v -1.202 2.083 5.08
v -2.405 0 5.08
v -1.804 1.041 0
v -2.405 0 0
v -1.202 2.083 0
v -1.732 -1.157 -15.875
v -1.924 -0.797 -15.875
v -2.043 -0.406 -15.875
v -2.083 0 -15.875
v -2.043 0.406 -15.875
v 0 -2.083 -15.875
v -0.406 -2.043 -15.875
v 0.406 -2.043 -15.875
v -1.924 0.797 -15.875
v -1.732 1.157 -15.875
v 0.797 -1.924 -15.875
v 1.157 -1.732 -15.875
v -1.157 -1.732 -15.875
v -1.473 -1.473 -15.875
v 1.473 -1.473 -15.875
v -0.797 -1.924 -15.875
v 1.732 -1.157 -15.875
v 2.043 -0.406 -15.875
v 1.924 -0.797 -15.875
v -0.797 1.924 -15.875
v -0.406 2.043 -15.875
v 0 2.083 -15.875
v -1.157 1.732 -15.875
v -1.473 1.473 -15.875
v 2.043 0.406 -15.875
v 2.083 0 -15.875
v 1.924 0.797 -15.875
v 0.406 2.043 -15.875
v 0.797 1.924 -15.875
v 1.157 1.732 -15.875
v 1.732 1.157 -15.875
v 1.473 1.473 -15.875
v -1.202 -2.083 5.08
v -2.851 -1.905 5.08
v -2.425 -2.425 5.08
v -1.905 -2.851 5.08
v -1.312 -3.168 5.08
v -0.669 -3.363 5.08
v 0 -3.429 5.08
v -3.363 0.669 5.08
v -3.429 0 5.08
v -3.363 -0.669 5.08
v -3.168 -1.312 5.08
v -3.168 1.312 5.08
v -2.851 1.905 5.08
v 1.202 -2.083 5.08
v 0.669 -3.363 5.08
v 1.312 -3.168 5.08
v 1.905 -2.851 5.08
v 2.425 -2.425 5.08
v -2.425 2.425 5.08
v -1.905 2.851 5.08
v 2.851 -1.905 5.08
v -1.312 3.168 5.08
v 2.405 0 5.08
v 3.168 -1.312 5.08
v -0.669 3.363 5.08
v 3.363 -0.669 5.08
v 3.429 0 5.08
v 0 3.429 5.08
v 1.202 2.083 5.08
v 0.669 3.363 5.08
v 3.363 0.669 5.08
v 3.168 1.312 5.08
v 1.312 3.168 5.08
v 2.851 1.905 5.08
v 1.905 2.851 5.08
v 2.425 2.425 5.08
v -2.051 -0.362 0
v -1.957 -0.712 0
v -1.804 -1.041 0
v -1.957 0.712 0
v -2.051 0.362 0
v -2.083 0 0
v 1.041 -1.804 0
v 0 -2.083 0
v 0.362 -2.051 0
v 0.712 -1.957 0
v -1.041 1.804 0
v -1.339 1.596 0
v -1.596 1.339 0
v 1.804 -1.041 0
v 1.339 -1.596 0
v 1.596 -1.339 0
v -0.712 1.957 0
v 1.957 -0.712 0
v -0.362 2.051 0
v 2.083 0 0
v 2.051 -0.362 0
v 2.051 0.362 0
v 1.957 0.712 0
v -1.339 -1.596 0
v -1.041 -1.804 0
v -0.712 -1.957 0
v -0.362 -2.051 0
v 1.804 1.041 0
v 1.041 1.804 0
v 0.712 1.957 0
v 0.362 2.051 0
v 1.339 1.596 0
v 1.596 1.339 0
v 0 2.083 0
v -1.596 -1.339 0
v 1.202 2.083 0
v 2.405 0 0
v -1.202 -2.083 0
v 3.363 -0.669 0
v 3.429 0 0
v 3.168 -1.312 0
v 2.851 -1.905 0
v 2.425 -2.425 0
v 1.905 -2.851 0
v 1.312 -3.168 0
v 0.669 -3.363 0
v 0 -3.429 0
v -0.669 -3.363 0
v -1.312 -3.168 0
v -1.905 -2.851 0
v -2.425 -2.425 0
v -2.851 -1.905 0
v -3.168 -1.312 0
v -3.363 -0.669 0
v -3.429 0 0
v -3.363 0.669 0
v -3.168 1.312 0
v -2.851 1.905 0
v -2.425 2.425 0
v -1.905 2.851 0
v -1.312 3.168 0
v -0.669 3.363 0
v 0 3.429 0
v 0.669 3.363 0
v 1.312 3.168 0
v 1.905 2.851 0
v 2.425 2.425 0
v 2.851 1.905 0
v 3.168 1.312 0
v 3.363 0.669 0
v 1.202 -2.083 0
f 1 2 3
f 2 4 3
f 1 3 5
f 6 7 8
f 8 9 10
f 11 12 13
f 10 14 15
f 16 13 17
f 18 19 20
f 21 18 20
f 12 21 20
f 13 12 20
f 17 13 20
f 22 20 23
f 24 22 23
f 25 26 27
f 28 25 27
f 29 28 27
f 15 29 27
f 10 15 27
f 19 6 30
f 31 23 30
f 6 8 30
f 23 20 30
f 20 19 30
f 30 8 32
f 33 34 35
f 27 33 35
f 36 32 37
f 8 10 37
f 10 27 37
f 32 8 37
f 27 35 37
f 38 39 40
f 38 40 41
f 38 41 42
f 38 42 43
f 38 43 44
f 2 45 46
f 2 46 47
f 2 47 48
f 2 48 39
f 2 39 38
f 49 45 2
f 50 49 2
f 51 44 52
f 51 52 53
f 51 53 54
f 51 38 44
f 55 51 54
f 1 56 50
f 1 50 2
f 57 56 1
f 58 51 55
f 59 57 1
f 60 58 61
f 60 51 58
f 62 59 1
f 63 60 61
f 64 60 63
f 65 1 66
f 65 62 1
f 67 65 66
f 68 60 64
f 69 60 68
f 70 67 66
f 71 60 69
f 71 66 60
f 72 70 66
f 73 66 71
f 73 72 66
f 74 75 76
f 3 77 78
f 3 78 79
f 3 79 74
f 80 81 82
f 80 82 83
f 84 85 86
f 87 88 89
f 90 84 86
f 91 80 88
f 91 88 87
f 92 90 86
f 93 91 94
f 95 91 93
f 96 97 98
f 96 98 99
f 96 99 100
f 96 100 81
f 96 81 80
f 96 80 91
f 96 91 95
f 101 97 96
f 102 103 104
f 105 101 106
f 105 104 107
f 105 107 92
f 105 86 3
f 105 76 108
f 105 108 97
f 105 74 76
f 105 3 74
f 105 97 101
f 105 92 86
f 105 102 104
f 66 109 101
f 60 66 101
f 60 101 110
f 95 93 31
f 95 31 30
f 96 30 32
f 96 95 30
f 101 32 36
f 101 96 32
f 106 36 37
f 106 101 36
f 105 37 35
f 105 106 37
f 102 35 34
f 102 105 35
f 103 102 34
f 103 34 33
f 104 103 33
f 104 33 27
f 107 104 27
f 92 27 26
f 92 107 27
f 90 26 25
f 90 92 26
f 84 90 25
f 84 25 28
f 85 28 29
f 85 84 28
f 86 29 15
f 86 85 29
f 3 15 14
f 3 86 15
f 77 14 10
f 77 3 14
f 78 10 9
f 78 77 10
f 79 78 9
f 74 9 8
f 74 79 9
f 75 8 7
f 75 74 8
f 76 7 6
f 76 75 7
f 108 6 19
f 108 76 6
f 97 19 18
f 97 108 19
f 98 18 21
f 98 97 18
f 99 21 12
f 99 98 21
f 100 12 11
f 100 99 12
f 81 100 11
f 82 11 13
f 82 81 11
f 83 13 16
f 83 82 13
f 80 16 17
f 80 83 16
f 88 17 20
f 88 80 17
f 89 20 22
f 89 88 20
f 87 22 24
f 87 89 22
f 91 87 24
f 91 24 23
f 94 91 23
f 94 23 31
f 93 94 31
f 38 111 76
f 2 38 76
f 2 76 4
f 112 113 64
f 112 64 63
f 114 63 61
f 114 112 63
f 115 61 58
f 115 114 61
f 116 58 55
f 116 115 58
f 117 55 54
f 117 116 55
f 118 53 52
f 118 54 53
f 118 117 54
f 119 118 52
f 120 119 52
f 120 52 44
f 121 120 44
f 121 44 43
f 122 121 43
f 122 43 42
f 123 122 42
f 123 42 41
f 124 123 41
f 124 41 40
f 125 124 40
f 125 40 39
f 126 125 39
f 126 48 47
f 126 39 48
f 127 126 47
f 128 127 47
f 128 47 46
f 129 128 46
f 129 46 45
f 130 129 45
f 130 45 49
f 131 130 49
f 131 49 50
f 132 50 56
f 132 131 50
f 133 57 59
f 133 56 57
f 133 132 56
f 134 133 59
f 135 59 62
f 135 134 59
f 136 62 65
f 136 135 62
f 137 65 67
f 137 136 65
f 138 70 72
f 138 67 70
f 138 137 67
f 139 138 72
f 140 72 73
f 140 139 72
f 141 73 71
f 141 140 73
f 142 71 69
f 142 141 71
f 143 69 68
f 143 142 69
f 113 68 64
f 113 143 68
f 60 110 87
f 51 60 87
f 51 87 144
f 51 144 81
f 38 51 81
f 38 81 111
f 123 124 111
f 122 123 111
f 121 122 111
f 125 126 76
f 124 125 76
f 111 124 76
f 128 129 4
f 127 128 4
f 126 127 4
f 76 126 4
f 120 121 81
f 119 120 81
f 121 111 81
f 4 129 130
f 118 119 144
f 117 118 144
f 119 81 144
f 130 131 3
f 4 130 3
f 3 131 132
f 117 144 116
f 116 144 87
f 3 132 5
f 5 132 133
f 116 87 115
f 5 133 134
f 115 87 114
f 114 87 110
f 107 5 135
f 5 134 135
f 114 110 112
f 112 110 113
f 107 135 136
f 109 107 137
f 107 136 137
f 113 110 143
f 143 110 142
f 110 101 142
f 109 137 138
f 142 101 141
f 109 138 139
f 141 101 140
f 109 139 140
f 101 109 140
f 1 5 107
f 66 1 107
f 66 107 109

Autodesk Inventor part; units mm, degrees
ref_plane "YZ Plane" through (0, 0, 0) normal (1, 0, 0) x (0, 1, 0)
ref_plane "XZ Plane" through (0, 0, 0) normal (0, 1, 0) x (-1, 0, 0)
ref_plane "XY Plane" through (0, 0, 0) normal (0, 0, 1) x (1, 0, 0)
sketch "Sketch1" plane through (0, 0, 0) normal (0, 0, 1) x (1, 0, 0)
  circle A0 centre (0, 0) radius 3.429
  circle A1 centre (0, 0) radius 2.0828
  line L0 (1.2025, 2.0828) -> (2.405, 0)
  line L1 (2.405, 0) -> (1.2025, -2.0828)
  line L2 (1.2025, -2.0828) -> (-1.2025, -2.0828)
  line L3 (-1.2025, -2.0828) -> (-2.405, 0)
  line L4 (-2.405, 0) -> (-1.2025, 2.0828)
  line L5 (-1.2025, 2.0828) -> (1.2025, 2.0828)
  dimension "d0" = 4.1656
  dimension "d1" = 6.858
extrude "Extrusion1" add sketch "Sketch1" against normal blind 15.875 contours A1
extrude "Extrusion2" add sketch "Sketch1" along normal blind 5.08
thread "Thread1" size "8-32 UNC" class "2A" standard "ANSI Unified Screw Threads" full length
properties part number "Bolt 8-32 bracket BD Drill motor mount"
